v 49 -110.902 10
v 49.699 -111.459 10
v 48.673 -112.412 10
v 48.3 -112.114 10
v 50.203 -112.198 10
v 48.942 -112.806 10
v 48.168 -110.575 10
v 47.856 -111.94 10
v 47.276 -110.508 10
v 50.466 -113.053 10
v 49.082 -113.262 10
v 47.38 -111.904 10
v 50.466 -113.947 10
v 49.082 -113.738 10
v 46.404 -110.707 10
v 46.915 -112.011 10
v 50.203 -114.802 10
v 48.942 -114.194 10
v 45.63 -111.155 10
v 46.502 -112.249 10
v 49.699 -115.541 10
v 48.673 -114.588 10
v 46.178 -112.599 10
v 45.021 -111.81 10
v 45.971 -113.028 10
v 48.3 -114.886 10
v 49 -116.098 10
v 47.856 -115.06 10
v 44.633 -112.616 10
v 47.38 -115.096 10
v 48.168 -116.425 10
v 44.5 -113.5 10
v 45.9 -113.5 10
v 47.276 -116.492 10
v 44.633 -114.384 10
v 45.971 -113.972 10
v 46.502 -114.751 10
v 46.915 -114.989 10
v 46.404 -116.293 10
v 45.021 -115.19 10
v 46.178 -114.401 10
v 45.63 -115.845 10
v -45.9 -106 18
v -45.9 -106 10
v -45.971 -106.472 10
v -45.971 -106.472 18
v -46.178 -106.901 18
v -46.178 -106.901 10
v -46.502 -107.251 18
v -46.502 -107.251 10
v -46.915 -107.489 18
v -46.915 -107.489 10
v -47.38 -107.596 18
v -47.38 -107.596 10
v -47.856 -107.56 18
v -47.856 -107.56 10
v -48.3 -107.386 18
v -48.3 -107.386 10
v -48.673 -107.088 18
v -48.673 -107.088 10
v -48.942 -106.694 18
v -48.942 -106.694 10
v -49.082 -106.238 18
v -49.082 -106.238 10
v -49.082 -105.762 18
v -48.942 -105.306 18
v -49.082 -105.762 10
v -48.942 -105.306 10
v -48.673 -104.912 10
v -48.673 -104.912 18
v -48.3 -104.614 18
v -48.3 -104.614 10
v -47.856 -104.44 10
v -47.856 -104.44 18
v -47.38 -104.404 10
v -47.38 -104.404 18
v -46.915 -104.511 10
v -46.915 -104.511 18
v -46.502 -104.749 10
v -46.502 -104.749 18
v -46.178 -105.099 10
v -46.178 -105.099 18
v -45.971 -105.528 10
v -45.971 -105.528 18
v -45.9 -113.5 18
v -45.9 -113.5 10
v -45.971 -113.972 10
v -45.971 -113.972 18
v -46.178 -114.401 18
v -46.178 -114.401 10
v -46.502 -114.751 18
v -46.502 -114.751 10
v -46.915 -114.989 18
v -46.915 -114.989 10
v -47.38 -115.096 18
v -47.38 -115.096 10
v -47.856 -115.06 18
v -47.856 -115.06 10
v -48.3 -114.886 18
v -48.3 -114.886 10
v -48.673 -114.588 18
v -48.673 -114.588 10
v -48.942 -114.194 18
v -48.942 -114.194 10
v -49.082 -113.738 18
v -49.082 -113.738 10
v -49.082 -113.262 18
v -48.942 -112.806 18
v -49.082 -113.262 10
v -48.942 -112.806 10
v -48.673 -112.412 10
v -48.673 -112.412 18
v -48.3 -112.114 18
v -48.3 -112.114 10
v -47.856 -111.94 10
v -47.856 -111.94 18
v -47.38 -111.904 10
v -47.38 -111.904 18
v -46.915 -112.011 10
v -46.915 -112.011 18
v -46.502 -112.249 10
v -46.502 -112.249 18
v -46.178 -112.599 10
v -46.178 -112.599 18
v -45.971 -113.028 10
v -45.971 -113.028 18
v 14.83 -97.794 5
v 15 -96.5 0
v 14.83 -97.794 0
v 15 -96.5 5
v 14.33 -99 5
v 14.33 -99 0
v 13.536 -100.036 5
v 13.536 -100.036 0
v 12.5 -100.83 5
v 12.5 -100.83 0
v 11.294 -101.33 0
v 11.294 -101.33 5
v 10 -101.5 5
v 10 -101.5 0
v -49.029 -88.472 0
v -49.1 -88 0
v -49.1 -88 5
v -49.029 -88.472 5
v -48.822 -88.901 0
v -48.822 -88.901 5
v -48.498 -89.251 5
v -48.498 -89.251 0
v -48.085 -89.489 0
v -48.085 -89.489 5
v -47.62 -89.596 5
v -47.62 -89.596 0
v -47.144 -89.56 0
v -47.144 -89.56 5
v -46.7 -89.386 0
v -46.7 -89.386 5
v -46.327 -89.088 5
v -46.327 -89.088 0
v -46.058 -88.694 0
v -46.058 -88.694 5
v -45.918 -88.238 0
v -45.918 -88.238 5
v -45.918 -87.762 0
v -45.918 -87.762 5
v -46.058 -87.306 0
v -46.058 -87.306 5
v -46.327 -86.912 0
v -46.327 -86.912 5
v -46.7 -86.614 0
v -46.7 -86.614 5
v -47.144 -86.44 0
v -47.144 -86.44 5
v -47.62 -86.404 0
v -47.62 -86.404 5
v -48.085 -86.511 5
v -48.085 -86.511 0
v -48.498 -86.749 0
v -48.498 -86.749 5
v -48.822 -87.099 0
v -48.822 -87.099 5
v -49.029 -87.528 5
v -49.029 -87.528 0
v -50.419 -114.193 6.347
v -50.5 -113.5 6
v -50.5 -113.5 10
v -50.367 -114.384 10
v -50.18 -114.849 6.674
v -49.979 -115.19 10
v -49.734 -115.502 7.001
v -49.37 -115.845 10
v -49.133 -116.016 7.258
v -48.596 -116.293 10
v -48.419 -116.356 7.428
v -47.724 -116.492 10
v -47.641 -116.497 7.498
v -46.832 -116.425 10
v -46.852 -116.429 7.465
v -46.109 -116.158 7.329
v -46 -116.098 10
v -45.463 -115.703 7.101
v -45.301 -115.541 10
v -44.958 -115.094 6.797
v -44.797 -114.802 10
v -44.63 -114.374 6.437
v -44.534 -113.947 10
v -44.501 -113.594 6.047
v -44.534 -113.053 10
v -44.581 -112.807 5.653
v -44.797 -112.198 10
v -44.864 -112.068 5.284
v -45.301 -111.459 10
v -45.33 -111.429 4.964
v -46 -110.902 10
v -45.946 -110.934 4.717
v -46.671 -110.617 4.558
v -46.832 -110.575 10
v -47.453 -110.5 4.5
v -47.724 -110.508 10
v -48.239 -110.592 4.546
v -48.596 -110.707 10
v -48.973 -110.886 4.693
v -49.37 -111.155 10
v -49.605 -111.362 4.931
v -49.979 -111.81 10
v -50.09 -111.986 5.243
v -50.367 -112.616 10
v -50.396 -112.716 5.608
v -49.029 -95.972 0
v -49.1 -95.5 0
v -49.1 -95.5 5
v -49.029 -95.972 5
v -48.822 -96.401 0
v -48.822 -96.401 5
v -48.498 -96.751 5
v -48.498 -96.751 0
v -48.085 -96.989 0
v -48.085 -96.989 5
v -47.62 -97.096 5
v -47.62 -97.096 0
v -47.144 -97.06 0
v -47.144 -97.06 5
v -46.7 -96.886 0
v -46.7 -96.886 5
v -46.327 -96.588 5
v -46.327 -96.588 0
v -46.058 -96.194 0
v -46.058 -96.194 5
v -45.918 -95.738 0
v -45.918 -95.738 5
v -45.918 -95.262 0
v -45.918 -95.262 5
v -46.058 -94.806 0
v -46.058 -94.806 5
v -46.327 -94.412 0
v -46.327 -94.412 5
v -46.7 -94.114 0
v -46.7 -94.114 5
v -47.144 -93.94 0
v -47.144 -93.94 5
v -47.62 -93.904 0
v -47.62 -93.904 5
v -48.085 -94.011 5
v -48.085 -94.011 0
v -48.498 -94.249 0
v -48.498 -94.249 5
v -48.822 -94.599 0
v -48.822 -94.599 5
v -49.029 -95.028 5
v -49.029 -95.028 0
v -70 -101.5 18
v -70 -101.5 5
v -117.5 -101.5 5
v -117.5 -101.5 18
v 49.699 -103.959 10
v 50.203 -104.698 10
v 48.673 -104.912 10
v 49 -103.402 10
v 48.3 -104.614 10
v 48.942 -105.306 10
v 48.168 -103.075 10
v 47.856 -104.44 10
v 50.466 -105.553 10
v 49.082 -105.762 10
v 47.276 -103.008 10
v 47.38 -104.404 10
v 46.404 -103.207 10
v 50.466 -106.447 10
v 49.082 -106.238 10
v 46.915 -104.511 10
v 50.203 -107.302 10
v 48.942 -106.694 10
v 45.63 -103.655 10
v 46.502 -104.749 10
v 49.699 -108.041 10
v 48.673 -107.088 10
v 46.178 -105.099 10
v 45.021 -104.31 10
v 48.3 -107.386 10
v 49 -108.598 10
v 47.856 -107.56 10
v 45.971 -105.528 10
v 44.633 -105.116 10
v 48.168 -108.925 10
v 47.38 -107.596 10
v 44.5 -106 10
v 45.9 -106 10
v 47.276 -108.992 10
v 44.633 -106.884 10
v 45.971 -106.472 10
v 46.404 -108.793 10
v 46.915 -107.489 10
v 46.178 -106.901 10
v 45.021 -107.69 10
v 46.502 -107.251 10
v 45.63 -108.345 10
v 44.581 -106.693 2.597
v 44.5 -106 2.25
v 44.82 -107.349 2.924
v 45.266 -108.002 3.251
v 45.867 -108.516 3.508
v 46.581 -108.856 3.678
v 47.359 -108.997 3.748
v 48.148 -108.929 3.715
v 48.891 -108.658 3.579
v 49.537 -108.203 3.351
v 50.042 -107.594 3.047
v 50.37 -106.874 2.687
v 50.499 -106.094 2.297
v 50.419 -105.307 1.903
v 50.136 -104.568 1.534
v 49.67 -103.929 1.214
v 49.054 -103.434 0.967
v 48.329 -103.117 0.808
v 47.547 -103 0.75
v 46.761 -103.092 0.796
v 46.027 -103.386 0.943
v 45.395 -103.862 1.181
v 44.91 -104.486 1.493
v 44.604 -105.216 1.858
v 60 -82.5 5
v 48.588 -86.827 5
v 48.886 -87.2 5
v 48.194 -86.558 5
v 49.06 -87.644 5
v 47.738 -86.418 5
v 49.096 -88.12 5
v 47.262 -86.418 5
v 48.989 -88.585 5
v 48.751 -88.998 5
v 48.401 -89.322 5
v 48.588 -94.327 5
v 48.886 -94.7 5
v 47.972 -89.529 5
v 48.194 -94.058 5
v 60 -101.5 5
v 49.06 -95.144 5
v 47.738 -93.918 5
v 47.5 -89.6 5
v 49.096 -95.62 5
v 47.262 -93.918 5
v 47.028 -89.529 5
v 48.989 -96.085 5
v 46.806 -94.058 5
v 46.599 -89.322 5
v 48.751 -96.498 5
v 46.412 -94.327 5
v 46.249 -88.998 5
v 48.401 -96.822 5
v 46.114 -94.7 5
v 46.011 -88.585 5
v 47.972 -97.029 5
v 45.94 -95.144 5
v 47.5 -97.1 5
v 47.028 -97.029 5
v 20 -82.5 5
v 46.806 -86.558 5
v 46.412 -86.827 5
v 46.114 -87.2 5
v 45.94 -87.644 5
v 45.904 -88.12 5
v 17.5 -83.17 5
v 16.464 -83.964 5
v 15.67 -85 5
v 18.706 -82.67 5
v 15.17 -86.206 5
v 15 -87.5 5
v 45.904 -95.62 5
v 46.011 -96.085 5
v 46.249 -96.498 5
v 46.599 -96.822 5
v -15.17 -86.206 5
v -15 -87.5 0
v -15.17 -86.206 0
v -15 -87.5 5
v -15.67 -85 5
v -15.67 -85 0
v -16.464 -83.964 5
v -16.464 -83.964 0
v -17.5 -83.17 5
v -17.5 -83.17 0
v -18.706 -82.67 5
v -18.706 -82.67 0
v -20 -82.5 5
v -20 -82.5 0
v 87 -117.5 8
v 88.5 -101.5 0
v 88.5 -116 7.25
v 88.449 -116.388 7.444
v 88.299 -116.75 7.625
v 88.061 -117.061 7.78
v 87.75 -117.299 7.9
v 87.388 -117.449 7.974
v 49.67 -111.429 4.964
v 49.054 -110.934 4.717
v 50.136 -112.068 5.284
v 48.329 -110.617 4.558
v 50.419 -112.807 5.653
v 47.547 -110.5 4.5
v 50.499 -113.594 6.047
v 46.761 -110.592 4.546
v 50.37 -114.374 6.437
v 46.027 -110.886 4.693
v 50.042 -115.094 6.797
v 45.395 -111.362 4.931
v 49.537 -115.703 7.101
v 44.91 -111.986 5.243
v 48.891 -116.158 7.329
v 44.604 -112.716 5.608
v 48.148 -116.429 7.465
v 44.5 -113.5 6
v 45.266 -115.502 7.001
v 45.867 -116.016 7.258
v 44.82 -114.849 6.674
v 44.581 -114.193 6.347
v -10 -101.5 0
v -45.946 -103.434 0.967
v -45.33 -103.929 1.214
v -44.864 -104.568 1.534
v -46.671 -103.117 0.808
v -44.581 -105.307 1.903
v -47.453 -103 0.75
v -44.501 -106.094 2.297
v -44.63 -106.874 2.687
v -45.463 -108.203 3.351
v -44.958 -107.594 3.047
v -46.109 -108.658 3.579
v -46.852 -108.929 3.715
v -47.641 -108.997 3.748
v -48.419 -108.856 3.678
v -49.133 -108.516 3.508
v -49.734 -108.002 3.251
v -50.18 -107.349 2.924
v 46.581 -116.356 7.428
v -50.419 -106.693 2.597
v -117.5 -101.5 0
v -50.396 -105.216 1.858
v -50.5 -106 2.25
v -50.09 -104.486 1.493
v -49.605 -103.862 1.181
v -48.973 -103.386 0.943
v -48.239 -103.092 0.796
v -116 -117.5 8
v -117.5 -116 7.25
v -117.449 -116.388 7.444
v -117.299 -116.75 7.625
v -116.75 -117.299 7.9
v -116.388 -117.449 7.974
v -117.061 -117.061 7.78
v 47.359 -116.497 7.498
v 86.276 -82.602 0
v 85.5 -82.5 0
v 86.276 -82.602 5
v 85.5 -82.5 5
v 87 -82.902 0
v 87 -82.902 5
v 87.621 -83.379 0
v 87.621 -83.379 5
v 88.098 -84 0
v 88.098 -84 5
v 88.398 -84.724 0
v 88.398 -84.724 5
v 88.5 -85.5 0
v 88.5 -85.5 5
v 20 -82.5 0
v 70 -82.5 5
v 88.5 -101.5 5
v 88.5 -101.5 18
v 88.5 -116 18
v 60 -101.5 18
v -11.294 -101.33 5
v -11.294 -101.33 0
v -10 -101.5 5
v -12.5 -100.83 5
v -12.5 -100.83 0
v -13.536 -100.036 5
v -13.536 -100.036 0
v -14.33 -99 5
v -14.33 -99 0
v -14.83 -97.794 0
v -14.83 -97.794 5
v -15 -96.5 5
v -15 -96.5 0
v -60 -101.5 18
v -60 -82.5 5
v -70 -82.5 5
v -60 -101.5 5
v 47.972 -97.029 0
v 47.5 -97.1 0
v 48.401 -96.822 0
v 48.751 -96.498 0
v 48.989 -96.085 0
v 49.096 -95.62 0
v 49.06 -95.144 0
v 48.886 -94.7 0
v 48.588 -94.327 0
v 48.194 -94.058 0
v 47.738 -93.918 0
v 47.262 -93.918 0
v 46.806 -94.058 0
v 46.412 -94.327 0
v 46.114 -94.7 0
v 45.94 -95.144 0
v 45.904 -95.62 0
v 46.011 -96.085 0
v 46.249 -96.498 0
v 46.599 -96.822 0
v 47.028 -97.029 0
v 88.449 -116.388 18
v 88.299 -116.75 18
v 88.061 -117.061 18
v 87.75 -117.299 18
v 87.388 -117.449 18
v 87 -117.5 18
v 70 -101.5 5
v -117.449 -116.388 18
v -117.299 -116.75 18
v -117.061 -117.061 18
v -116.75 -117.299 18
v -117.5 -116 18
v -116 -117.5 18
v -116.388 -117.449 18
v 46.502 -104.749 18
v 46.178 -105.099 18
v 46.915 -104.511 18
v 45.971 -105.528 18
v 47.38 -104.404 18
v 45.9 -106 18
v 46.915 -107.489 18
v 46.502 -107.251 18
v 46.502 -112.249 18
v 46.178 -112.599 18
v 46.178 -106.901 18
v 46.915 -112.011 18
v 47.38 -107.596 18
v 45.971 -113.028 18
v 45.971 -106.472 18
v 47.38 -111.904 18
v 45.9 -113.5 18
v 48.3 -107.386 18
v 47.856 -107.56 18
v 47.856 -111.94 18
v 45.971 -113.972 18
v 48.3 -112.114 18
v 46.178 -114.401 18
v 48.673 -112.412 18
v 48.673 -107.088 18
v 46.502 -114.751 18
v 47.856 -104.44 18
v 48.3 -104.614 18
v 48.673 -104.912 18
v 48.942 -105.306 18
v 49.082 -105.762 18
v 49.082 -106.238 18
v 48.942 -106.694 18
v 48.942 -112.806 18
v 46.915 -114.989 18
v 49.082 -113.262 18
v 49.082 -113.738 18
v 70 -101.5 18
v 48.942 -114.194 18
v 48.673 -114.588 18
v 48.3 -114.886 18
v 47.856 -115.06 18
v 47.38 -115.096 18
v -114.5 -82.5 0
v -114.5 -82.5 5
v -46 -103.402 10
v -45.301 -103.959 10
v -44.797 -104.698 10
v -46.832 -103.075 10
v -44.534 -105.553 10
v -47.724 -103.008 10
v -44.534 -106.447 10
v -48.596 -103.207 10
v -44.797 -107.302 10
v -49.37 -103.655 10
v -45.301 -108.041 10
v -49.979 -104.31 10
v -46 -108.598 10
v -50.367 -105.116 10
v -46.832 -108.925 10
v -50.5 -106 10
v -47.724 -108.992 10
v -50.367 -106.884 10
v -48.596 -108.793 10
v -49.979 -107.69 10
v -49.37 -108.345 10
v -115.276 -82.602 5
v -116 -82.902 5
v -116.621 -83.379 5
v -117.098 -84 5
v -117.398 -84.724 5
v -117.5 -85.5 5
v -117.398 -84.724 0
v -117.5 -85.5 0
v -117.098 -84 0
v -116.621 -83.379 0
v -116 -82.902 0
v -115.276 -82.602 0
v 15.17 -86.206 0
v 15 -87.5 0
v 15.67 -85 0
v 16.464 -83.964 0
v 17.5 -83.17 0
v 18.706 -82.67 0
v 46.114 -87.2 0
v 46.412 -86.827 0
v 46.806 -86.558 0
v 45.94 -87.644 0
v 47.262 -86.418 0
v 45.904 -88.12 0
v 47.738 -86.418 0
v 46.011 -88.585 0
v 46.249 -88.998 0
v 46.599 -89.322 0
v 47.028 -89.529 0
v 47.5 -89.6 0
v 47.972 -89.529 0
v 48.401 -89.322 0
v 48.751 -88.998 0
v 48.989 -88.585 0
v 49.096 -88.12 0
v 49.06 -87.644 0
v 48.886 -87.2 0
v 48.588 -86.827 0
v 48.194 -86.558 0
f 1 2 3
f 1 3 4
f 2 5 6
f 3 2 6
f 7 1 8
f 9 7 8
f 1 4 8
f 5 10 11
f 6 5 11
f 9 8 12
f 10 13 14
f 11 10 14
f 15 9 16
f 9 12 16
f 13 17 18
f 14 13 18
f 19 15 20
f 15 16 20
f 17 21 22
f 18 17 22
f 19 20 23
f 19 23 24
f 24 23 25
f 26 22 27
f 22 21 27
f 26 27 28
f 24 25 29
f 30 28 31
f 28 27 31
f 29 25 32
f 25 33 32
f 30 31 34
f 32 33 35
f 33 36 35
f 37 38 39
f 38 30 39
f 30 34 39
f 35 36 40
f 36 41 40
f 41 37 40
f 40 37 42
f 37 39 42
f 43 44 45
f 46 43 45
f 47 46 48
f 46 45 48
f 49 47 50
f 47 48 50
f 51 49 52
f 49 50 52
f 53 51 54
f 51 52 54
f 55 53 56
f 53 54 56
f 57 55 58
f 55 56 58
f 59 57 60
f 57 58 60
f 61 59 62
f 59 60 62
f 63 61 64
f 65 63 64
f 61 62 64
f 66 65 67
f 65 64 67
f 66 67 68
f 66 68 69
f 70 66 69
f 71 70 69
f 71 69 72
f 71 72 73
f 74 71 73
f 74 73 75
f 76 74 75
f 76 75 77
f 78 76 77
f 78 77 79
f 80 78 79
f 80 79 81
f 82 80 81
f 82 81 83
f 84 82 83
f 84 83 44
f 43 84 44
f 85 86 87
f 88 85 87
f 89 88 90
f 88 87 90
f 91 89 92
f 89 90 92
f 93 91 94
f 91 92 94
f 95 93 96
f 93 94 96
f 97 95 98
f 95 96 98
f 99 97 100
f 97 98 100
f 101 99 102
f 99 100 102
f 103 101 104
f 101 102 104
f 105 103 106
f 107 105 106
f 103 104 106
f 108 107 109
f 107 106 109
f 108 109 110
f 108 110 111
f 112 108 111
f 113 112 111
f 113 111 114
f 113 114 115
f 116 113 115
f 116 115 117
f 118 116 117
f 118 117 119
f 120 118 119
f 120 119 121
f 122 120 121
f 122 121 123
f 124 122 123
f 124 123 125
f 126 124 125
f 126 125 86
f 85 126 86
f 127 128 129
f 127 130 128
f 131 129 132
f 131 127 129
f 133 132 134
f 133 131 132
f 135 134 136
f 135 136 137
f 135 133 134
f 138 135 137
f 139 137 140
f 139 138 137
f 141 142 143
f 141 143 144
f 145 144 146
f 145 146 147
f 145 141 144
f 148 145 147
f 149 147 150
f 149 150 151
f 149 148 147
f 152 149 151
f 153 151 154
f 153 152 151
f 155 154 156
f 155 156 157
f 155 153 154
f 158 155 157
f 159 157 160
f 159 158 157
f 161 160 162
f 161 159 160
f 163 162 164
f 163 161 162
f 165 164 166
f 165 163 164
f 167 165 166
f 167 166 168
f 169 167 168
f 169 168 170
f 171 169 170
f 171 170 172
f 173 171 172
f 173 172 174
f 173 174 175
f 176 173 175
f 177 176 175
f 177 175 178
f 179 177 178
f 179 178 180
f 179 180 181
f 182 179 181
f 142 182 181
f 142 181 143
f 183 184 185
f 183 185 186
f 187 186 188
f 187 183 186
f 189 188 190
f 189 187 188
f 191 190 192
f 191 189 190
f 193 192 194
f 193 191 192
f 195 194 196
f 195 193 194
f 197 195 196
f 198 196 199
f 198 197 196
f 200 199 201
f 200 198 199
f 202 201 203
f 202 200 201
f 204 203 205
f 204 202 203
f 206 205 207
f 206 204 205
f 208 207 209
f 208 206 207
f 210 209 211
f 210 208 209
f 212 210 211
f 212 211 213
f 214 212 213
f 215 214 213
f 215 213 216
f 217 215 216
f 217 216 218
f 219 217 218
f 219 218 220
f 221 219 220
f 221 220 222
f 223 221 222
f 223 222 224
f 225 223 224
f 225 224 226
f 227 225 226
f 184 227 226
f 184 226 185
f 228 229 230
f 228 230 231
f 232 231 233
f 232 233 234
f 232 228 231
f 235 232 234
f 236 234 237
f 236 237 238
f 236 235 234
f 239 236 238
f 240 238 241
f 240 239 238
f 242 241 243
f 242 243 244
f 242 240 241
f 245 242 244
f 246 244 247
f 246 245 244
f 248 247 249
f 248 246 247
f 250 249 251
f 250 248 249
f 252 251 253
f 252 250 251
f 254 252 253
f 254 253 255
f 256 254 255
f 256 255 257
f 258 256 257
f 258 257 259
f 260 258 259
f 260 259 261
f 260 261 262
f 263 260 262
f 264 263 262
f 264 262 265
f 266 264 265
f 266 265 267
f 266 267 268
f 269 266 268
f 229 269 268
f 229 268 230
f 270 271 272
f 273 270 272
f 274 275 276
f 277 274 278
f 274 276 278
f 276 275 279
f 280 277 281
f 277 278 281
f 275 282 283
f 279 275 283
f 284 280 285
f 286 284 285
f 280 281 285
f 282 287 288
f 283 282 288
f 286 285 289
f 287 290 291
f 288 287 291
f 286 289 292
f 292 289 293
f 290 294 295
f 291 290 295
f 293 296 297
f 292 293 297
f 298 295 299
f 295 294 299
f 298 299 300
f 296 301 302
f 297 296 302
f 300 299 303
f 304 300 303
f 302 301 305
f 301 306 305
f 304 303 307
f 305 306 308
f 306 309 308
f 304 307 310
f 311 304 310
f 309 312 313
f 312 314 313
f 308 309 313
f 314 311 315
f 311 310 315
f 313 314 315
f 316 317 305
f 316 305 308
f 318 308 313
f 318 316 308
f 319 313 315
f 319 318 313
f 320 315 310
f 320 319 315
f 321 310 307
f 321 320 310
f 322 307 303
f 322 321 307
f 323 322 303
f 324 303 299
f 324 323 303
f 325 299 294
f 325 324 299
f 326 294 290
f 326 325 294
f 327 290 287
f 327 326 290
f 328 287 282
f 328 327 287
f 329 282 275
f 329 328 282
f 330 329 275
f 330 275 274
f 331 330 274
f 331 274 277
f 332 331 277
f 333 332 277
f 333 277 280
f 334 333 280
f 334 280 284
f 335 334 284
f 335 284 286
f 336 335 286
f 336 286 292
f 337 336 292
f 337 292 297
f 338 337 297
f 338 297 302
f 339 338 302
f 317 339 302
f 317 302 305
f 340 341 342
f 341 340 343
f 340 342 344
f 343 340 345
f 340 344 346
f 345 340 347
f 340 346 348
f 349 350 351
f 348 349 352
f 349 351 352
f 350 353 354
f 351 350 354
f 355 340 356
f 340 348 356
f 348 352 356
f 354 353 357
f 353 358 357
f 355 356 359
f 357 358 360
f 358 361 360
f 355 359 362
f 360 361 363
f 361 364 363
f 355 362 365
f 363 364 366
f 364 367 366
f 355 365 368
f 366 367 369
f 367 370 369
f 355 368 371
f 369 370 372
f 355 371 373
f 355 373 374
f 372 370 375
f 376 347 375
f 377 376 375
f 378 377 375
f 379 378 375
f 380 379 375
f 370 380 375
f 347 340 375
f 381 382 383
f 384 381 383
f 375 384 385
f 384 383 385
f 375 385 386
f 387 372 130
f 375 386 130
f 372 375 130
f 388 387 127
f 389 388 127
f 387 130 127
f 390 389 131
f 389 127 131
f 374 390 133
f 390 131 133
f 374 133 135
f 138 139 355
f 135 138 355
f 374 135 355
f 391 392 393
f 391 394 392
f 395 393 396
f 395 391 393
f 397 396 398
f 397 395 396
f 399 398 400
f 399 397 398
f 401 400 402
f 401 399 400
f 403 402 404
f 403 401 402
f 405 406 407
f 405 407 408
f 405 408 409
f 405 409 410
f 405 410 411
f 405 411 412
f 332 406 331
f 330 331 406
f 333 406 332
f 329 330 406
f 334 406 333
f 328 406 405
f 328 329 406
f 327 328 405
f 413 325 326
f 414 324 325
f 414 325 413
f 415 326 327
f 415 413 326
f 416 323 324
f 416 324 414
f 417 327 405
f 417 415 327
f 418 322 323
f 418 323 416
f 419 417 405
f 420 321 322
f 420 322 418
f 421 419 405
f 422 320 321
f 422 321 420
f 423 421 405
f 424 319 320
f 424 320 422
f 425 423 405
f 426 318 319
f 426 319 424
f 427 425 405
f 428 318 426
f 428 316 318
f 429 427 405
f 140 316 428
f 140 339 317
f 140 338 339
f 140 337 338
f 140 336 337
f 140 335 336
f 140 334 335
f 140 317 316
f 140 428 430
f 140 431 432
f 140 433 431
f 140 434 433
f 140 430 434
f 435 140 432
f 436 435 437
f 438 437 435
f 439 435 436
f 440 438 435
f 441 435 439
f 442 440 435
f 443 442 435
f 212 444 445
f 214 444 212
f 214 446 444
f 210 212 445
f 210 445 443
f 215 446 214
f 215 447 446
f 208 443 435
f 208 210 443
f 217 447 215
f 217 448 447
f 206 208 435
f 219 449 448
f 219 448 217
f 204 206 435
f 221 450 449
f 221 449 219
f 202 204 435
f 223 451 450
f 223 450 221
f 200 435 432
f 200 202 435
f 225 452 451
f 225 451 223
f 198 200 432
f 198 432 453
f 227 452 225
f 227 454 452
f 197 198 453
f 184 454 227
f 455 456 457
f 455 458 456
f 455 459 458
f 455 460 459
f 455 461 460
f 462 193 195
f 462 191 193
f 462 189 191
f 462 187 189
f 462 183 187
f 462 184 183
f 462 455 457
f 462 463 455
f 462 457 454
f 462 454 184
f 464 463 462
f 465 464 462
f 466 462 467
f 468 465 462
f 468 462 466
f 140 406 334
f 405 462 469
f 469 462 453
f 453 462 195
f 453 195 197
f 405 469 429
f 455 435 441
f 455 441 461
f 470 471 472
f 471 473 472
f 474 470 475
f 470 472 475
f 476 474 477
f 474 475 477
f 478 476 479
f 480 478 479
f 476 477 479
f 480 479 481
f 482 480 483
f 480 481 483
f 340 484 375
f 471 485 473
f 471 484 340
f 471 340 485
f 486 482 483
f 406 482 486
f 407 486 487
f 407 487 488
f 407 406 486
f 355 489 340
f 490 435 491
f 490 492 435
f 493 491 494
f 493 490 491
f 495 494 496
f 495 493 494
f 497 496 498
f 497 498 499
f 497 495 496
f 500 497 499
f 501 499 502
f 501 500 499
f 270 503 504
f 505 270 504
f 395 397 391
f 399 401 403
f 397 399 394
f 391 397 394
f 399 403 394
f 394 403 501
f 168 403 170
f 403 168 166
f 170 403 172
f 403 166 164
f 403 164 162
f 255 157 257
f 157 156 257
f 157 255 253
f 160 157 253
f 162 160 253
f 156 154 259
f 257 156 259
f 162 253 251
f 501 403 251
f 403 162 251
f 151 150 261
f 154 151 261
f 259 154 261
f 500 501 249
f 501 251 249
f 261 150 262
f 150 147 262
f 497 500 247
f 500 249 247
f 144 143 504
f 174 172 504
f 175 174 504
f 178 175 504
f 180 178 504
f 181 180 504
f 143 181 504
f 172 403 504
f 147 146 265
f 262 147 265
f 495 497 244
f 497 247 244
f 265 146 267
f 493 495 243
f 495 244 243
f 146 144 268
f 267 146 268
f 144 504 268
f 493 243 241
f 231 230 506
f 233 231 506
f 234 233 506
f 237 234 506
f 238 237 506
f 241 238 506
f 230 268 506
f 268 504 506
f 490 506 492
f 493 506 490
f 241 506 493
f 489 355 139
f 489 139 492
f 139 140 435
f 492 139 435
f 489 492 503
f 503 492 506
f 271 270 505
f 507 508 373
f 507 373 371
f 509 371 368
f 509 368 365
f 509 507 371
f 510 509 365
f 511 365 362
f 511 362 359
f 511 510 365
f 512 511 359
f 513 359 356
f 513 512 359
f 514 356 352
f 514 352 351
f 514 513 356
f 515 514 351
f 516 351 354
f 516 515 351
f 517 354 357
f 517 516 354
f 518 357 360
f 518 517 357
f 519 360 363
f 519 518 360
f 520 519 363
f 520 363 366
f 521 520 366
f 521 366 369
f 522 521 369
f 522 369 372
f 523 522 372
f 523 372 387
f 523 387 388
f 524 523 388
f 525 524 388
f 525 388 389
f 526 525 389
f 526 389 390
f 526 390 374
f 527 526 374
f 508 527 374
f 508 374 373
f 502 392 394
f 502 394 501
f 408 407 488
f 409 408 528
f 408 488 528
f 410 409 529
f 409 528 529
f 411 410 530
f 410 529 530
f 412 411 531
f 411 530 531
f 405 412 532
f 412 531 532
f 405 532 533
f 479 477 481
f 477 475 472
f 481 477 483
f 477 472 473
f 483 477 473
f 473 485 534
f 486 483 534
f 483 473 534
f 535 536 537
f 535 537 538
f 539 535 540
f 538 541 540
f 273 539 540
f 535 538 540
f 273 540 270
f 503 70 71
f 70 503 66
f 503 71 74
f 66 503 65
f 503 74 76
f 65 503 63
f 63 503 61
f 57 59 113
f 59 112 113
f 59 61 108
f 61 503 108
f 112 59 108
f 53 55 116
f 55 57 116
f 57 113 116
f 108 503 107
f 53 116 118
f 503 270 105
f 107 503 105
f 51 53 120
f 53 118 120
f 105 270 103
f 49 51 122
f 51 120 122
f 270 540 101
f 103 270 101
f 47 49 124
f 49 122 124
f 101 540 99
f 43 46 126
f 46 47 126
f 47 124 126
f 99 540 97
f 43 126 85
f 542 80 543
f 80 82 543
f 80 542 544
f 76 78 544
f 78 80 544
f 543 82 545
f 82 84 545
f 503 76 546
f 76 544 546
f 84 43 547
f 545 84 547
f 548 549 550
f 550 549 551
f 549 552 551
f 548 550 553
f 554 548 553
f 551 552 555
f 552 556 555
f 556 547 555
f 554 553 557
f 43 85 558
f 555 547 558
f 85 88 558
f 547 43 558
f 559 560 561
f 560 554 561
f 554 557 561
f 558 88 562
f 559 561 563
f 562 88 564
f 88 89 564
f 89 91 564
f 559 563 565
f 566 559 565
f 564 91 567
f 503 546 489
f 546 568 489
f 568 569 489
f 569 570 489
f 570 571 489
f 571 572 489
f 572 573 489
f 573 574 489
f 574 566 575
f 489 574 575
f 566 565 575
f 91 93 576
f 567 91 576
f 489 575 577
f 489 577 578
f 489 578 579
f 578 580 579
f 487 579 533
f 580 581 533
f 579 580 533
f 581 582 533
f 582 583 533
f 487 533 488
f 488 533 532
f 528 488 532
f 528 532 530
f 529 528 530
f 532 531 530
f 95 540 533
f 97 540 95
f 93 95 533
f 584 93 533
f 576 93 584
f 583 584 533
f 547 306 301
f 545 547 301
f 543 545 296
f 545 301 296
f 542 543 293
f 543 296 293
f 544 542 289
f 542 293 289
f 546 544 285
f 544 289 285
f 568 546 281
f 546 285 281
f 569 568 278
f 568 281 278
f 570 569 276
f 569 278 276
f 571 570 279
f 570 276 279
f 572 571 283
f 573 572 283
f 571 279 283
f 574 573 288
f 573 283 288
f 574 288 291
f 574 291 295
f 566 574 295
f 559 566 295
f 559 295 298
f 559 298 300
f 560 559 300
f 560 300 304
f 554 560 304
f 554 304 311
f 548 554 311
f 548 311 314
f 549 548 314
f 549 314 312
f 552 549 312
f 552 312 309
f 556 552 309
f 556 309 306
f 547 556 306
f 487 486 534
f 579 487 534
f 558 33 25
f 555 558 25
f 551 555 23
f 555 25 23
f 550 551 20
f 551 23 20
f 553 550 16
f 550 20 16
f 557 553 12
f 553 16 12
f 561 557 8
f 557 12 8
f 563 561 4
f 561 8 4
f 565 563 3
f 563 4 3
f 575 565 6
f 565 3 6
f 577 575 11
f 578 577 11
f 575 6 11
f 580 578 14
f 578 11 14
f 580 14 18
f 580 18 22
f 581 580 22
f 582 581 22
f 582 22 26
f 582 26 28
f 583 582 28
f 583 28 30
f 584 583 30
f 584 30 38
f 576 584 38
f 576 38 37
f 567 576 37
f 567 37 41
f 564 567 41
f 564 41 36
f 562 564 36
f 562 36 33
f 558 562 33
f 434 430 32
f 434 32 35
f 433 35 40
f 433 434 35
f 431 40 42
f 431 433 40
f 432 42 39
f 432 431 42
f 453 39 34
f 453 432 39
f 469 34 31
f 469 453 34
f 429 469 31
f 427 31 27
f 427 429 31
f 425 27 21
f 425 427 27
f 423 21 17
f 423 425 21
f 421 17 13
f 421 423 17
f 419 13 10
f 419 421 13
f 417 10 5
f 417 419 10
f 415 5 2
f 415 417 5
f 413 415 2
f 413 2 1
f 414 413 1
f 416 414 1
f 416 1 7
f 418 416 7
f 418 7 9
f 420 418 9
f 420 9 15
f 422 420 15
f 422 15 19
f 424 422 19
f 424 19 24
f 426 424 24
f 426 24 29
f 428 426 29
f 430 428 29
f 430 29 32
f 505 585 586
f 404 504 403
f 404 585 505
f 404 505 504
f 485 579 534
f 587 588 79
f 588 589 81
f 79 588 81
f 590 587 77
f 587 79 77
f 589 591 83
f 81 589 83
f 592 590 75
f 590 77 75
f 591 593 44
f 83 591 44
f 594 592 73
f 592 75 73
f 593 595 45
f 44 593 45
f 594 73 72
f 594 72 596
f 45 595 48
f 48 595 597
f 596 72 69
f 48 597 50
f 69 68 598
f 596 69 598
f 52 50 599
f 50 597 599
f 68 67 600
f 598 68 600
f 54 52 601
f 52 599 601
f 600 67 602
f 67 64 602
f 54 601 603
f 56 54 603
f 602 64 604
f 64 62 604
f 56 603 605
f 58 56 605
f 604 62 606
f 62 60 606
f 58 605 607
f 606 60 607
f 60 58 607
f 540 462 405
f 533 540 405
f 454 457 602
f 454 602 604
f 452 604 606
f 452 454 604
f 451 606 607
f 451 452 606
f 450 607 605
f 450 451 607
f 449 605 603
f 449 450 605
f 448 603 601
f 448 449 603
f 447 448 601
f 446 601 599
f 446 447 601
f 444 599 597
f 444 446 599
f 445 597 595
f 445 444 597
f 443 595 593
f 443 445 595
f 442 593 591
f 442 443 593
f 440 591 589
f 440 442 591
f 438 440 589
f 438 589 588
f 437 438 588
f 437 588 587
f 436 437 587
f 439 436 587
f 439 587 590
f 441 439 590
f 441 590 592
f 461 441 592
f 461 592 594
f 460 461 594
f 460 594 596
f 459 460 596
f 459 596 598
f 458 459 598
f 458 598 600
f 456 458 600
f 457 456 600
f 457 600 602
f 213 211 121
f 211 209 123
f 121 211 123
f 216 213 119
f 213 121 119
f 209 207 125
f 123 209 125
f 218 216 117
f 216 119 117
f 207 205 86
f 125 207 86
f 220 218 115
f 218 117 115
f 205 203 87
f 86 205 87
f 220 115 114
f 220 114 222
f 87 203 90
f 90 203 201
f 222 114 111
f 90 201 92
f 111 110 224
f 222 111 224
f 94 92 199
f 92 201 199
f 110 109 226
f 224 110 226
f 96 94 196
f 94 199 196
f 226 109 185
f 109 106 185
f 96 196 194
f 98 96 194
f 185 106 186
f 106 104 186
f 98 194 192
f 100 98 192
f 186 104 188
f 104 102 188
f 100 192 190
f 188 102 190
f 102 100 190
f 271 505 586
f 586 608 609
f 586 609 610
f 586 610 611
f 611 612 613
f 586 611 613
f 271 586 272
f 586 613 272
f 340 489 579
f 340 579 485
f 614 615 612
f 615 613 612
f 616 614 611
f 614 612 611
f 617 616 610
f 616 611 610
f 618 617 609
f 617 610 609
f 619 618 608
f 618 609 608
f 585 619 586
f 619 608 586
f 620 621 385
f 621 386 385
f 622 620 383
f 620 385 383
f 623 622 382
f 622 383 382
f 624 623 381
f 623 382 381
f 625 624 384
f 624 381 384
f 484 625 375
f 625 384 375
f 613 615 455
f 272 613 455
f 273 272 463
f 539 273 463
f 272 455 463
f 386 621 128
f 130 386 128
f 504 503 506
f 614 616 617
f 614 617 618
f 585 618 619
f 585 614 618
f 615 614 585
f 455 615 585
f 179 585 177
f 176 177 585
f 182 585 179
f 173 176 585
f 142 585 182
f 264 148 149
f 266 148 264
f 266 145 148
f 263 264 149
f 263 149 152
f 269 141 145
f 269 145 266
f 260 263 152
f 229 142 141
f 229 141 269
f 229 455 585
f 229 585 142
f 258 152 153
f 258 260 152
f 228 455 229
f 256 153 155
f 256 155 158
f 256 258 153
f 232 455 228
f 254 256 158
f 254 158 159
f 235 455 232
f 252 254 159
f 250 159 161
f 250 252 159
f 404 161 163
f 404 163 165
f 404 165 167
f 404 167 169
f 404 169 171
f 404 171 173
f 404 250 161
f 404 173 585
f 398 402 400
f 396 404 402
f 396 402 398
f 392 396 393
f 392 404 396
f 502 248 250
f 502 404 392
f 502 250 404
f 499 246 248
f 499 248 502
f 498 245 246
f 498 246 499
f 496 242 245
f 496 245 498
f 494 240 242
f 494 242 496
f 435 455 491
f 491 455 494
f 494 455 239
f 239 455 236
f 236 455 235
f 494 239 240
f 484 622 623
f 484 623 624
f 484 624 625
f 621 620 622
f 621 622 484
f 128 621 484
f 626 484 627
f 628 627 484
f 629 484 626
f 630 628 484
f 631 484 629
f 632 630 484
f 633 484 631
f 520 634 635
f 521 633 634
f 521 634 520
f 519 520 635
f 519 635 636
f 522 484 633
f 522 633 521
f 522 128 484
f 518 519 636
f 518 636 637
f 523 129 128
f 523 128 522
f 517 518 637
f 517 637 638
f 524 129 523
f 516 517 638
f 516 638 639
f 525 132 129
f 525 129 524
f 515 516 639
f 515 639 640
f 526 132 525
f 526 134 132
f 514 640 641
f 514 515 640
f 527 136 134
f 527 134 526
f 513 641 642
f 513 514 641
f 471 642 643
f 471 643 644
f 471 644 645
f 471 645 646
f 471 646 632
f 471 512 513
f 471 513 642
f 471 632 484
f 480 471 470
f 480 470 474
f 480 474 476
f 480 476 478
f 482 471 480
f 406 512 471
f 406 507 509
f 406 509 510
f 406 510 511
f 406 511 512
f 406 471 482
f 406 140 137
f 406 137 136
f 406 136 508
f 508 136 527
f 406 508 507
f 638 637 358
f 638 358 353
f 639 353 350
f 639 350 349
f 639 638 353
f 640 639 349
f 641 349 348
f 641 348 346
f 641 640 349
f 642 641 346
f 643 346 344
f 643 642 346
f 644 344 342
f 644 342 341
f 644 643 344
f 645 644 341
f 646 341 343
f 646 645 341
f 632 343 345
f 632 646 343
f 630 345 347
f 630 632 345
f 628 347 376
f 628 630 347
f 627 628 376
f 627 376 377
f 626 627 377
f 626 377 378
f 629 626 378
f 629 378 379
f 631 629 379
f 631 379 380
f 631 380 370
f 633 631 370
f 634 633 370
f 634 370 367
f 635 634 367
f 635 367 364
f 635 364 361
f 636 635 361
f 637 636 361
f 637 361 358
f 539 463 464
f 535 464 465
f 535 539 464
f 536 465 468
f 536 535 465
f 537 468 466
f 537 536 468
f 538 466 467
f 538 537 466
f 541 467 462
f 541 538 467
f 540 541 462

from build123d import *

# Parameters (mm, degrees)
SKETCH_1_W           = 235
SKETCH_1_H           = 35
SKETCH_1_R           = 1.6
EXTRUDE_1_DEPTH      = 18
FILLET_1_R           = 1.5
CUT_EXTRUDE_1_DEPTH  = 237.337153237
SKETCH_3_W           = 13
SKETCH_3_H           = 19
CUT_EXTRUDE_2_DEPTH  = 237.337153237
SKETCH_5_R           = 1.6
CUT_EXTRUDE_5_DEPTH  = 121.151987083
SKETCH_6_R           = 3
CUT_EXTRUDE_6_DEPTH  = 10
SKETCH_10_W          = 29
SKETCH_10_H          = 35
CUT_EXTRUDE_9_DEPTH  = 30
FILLET_2_R           = 3
FILLET_5_R           = 1.5
SKETCH_11_W          = 30
SKETCH_11_H          = 19
CUT_EXTRUDE_10_DEPTH = 30
FILLET_6_R           = 5
EXTRUDE_2_DEPTH      = 10
SKETCH_13_W          = 250
SKETCH_13_H          = 88
CUT_EXTRUDE_11_DEPTH = 168.142155066


with BuildPart() as part:
    # 草图1 → 凸台-拉伸1 (new body)
    with BuildSketch(Plane.XY):
        Rectangle(SKETCH_1_W, SKETCH_1_H)
        with Locations((-47.5, 13.5)):
            Circle(SKETCH_1_R, mode=Mode.SUBTRACT)
        with Locations(Location((47.5, 13.5, 0), (0, 0, 180))):
            Circle(SKETCH_1_R, mode=Mode.SUBTRACT)
        with Locations((-47.5, 6)):
            Circle(SKETCH_1_R, mode=Mode.SUBTRACT)
        with Locations(Location((47.5, 6, 0), (0, 0, 180))):
            Circle(SKETCH_1_R, mode=Mode.SUBTRACT)
    extrude(amount=EXTRUDE_1_DEPTH)

    # 圆角1
    fillet_1_edges = [part.edges().sort_by_distance(p)[0] for p in [
        (-117.5, 17.5, 9),
        (117.5, 17.5, 9),
    ]]
    fillet(fillet_1_edges, radius=FILLET_1_R)

    # 草图2 → 切除-拉伸1 (cut, through all)
    with BuildSketch(Plane.ZY.offset(117.5)):
        Polygon((0, 1.5), (8, 17.5), (0, 17.5), align=None)
    extrude(amount=-CUT_EXTRUDE_1_DEPTH, mode=Mode.SUBTRACT)

    # 草图3 → 切除-拉伸2 (cut, through all)
    with BuildSketch(Plane.ZY.offset(117.5)):
        with Locations((11.5, -8)):
            Rectangle(SKETCH_3_W, SKETCH_3_H)
    extrude(amount=-CUT_EXTRUDE_2_DEPTH, mode=Mode.SUBTRACT)

    # 草图5 → 切除-拉伸5 (cut, through all)
    with BuildSketch(Plane(origin=(0, 0, 0), x_dir=(-1, 0, 0), z_dir=(0, 0, -1))):
        with Locations((47.5, -4.5)):
            Circle(SKETCH_5_R)
        with Locations((47.5, -12)):
            Circle(SKETCH_5_R)
        with Locations(Location((-47.5, -12, 0), (0, 0, 90))):
            Circle(SKETCH_5_R)
        with Locations(Location((-47.5, -4.5, 0), (0, 0, 90))):
            Circle(SKETCH_5_R)
    extrude(amount=-CUT_EXTRUDE_5_DEPTH, mode=Mode.SUBTRACT)

    # 草图6 → 切除-拉伸6 (cut)
    with BuildSketch(Plane(origin=(0, 0, 0), x_dir=(-1, 0, 0), z_dir=(0, 0, -1))):
        with Locations((47.5, 6)):
            Circle(SKETCH_6_R)
        with Locations((47.5, 13.5)):
            Circle(SKETCH_6_R)
        with Locations((-47.5, 6)):
            Circle(SKETCH_6_R)
        with Locations((-47.5, 13.5)):
            Circle(SKETCH_6_R)
    extrude(amount=-CUT_EXTRUDE_6_DEPTH, mode=Mode.SUBTRACT)

    # 草图10 → 切除-拉伸9 (cut)
    with BuildSketch(Plane(origin=(0, 0, 0), x_dir=(-1, 0, 0), z_dir=(0, 0, -1))):
        with Locations((-103, 0)):
            Rectangle(SKETCH_10_W, SKETCH_10_H)
    extrude(amount=-CUT_EXTRUDE_9_DEPTH, mode=Mode.SUBTRACT)

    # 圆角2
    fillet_2_edges = [part.edges().sort_by_distance(p)[0] for p in [
        (88.5, -17.5, 2.5),
        (-117.5, -17.5, 2.5),
    ]]
    fillet(fillet_2_edges, radius=FILLET_2_R)

    # 圆角5
    fillet_5_edges = [part.edges().sort_by_distance(p)[0] for p in [
        (88.5, 17.5, 13),
    ]]
    fillet(fillet_5_edges, radius=FILLET_5_R)

    # 草图11 → 切除-拉伸10 (cut)
    with BuildSketch(Plane(origin=(0, 0, 0), x_dir=(-1, 0, 0), z_dir=(0, 0, -1))):
        with Locations((0, -8)):
            Rectangle(SKETCH_11_W, SKETCH_11_H)
    extrude(amount=-CUT_EXTRUDE_10_DEPTH, mode=Mode.SUBTRACT)

    # 圆角6
    fillet_6_edges = [part.edges().sort_by_distance(p)[0] for p in [
        (15, 1.5, 2.5),
        (-15, -17.5, 2.5),
        (15, -17.5, 2.5),
        (-15, 1.5, 2.5),
    ]]
    fillet(fillet_6_edges, radius=FILLET_6_R)

    # 草图12 → 凸台-拉伸2 (add)
    with BuildSketch(Plane(origin=(60, 0, 0), x_dir=(0, 0, -1), z_dir=(1, 0, 0))):
        Polygon((-18, 1.5), (-5, -17.5), (-5, 1.5), align=None)
    extrude_2 = extrude(amount=EXTRUDE_2_DEPTH)

    # 镜向1: 凸台-拉伸2 across plane
    add(extrude_2.mirror(Plane(origin=(0, 0, 0), x_dir=(0, 0, 1), z_dir=(1, 0, 0))))


with BuildPart() as body_2:
    # 镜向2: mirrored copy
    add(part.part.mirror(Plane.ZX.offset(-50)))


with BuildPart() as part_1:
    add(part.part)

    # 草图13 → 切除-拉伸11 (cut, through all)
    with BuildSketch(Plane(origin=(0, 0, 0), x_dir=(-1, 0, 0), z_dir=(0, 0, -1))):
        with Locations((13.680717654, 5.907187604)):
            Rectangle(SKETCH_13_W, SKETCH_13_H)
    extrude(amount=-CUT_EXTRUDE_11_DEPTH, mode=Mode.SUBTRACT)


solid = body_2.part
